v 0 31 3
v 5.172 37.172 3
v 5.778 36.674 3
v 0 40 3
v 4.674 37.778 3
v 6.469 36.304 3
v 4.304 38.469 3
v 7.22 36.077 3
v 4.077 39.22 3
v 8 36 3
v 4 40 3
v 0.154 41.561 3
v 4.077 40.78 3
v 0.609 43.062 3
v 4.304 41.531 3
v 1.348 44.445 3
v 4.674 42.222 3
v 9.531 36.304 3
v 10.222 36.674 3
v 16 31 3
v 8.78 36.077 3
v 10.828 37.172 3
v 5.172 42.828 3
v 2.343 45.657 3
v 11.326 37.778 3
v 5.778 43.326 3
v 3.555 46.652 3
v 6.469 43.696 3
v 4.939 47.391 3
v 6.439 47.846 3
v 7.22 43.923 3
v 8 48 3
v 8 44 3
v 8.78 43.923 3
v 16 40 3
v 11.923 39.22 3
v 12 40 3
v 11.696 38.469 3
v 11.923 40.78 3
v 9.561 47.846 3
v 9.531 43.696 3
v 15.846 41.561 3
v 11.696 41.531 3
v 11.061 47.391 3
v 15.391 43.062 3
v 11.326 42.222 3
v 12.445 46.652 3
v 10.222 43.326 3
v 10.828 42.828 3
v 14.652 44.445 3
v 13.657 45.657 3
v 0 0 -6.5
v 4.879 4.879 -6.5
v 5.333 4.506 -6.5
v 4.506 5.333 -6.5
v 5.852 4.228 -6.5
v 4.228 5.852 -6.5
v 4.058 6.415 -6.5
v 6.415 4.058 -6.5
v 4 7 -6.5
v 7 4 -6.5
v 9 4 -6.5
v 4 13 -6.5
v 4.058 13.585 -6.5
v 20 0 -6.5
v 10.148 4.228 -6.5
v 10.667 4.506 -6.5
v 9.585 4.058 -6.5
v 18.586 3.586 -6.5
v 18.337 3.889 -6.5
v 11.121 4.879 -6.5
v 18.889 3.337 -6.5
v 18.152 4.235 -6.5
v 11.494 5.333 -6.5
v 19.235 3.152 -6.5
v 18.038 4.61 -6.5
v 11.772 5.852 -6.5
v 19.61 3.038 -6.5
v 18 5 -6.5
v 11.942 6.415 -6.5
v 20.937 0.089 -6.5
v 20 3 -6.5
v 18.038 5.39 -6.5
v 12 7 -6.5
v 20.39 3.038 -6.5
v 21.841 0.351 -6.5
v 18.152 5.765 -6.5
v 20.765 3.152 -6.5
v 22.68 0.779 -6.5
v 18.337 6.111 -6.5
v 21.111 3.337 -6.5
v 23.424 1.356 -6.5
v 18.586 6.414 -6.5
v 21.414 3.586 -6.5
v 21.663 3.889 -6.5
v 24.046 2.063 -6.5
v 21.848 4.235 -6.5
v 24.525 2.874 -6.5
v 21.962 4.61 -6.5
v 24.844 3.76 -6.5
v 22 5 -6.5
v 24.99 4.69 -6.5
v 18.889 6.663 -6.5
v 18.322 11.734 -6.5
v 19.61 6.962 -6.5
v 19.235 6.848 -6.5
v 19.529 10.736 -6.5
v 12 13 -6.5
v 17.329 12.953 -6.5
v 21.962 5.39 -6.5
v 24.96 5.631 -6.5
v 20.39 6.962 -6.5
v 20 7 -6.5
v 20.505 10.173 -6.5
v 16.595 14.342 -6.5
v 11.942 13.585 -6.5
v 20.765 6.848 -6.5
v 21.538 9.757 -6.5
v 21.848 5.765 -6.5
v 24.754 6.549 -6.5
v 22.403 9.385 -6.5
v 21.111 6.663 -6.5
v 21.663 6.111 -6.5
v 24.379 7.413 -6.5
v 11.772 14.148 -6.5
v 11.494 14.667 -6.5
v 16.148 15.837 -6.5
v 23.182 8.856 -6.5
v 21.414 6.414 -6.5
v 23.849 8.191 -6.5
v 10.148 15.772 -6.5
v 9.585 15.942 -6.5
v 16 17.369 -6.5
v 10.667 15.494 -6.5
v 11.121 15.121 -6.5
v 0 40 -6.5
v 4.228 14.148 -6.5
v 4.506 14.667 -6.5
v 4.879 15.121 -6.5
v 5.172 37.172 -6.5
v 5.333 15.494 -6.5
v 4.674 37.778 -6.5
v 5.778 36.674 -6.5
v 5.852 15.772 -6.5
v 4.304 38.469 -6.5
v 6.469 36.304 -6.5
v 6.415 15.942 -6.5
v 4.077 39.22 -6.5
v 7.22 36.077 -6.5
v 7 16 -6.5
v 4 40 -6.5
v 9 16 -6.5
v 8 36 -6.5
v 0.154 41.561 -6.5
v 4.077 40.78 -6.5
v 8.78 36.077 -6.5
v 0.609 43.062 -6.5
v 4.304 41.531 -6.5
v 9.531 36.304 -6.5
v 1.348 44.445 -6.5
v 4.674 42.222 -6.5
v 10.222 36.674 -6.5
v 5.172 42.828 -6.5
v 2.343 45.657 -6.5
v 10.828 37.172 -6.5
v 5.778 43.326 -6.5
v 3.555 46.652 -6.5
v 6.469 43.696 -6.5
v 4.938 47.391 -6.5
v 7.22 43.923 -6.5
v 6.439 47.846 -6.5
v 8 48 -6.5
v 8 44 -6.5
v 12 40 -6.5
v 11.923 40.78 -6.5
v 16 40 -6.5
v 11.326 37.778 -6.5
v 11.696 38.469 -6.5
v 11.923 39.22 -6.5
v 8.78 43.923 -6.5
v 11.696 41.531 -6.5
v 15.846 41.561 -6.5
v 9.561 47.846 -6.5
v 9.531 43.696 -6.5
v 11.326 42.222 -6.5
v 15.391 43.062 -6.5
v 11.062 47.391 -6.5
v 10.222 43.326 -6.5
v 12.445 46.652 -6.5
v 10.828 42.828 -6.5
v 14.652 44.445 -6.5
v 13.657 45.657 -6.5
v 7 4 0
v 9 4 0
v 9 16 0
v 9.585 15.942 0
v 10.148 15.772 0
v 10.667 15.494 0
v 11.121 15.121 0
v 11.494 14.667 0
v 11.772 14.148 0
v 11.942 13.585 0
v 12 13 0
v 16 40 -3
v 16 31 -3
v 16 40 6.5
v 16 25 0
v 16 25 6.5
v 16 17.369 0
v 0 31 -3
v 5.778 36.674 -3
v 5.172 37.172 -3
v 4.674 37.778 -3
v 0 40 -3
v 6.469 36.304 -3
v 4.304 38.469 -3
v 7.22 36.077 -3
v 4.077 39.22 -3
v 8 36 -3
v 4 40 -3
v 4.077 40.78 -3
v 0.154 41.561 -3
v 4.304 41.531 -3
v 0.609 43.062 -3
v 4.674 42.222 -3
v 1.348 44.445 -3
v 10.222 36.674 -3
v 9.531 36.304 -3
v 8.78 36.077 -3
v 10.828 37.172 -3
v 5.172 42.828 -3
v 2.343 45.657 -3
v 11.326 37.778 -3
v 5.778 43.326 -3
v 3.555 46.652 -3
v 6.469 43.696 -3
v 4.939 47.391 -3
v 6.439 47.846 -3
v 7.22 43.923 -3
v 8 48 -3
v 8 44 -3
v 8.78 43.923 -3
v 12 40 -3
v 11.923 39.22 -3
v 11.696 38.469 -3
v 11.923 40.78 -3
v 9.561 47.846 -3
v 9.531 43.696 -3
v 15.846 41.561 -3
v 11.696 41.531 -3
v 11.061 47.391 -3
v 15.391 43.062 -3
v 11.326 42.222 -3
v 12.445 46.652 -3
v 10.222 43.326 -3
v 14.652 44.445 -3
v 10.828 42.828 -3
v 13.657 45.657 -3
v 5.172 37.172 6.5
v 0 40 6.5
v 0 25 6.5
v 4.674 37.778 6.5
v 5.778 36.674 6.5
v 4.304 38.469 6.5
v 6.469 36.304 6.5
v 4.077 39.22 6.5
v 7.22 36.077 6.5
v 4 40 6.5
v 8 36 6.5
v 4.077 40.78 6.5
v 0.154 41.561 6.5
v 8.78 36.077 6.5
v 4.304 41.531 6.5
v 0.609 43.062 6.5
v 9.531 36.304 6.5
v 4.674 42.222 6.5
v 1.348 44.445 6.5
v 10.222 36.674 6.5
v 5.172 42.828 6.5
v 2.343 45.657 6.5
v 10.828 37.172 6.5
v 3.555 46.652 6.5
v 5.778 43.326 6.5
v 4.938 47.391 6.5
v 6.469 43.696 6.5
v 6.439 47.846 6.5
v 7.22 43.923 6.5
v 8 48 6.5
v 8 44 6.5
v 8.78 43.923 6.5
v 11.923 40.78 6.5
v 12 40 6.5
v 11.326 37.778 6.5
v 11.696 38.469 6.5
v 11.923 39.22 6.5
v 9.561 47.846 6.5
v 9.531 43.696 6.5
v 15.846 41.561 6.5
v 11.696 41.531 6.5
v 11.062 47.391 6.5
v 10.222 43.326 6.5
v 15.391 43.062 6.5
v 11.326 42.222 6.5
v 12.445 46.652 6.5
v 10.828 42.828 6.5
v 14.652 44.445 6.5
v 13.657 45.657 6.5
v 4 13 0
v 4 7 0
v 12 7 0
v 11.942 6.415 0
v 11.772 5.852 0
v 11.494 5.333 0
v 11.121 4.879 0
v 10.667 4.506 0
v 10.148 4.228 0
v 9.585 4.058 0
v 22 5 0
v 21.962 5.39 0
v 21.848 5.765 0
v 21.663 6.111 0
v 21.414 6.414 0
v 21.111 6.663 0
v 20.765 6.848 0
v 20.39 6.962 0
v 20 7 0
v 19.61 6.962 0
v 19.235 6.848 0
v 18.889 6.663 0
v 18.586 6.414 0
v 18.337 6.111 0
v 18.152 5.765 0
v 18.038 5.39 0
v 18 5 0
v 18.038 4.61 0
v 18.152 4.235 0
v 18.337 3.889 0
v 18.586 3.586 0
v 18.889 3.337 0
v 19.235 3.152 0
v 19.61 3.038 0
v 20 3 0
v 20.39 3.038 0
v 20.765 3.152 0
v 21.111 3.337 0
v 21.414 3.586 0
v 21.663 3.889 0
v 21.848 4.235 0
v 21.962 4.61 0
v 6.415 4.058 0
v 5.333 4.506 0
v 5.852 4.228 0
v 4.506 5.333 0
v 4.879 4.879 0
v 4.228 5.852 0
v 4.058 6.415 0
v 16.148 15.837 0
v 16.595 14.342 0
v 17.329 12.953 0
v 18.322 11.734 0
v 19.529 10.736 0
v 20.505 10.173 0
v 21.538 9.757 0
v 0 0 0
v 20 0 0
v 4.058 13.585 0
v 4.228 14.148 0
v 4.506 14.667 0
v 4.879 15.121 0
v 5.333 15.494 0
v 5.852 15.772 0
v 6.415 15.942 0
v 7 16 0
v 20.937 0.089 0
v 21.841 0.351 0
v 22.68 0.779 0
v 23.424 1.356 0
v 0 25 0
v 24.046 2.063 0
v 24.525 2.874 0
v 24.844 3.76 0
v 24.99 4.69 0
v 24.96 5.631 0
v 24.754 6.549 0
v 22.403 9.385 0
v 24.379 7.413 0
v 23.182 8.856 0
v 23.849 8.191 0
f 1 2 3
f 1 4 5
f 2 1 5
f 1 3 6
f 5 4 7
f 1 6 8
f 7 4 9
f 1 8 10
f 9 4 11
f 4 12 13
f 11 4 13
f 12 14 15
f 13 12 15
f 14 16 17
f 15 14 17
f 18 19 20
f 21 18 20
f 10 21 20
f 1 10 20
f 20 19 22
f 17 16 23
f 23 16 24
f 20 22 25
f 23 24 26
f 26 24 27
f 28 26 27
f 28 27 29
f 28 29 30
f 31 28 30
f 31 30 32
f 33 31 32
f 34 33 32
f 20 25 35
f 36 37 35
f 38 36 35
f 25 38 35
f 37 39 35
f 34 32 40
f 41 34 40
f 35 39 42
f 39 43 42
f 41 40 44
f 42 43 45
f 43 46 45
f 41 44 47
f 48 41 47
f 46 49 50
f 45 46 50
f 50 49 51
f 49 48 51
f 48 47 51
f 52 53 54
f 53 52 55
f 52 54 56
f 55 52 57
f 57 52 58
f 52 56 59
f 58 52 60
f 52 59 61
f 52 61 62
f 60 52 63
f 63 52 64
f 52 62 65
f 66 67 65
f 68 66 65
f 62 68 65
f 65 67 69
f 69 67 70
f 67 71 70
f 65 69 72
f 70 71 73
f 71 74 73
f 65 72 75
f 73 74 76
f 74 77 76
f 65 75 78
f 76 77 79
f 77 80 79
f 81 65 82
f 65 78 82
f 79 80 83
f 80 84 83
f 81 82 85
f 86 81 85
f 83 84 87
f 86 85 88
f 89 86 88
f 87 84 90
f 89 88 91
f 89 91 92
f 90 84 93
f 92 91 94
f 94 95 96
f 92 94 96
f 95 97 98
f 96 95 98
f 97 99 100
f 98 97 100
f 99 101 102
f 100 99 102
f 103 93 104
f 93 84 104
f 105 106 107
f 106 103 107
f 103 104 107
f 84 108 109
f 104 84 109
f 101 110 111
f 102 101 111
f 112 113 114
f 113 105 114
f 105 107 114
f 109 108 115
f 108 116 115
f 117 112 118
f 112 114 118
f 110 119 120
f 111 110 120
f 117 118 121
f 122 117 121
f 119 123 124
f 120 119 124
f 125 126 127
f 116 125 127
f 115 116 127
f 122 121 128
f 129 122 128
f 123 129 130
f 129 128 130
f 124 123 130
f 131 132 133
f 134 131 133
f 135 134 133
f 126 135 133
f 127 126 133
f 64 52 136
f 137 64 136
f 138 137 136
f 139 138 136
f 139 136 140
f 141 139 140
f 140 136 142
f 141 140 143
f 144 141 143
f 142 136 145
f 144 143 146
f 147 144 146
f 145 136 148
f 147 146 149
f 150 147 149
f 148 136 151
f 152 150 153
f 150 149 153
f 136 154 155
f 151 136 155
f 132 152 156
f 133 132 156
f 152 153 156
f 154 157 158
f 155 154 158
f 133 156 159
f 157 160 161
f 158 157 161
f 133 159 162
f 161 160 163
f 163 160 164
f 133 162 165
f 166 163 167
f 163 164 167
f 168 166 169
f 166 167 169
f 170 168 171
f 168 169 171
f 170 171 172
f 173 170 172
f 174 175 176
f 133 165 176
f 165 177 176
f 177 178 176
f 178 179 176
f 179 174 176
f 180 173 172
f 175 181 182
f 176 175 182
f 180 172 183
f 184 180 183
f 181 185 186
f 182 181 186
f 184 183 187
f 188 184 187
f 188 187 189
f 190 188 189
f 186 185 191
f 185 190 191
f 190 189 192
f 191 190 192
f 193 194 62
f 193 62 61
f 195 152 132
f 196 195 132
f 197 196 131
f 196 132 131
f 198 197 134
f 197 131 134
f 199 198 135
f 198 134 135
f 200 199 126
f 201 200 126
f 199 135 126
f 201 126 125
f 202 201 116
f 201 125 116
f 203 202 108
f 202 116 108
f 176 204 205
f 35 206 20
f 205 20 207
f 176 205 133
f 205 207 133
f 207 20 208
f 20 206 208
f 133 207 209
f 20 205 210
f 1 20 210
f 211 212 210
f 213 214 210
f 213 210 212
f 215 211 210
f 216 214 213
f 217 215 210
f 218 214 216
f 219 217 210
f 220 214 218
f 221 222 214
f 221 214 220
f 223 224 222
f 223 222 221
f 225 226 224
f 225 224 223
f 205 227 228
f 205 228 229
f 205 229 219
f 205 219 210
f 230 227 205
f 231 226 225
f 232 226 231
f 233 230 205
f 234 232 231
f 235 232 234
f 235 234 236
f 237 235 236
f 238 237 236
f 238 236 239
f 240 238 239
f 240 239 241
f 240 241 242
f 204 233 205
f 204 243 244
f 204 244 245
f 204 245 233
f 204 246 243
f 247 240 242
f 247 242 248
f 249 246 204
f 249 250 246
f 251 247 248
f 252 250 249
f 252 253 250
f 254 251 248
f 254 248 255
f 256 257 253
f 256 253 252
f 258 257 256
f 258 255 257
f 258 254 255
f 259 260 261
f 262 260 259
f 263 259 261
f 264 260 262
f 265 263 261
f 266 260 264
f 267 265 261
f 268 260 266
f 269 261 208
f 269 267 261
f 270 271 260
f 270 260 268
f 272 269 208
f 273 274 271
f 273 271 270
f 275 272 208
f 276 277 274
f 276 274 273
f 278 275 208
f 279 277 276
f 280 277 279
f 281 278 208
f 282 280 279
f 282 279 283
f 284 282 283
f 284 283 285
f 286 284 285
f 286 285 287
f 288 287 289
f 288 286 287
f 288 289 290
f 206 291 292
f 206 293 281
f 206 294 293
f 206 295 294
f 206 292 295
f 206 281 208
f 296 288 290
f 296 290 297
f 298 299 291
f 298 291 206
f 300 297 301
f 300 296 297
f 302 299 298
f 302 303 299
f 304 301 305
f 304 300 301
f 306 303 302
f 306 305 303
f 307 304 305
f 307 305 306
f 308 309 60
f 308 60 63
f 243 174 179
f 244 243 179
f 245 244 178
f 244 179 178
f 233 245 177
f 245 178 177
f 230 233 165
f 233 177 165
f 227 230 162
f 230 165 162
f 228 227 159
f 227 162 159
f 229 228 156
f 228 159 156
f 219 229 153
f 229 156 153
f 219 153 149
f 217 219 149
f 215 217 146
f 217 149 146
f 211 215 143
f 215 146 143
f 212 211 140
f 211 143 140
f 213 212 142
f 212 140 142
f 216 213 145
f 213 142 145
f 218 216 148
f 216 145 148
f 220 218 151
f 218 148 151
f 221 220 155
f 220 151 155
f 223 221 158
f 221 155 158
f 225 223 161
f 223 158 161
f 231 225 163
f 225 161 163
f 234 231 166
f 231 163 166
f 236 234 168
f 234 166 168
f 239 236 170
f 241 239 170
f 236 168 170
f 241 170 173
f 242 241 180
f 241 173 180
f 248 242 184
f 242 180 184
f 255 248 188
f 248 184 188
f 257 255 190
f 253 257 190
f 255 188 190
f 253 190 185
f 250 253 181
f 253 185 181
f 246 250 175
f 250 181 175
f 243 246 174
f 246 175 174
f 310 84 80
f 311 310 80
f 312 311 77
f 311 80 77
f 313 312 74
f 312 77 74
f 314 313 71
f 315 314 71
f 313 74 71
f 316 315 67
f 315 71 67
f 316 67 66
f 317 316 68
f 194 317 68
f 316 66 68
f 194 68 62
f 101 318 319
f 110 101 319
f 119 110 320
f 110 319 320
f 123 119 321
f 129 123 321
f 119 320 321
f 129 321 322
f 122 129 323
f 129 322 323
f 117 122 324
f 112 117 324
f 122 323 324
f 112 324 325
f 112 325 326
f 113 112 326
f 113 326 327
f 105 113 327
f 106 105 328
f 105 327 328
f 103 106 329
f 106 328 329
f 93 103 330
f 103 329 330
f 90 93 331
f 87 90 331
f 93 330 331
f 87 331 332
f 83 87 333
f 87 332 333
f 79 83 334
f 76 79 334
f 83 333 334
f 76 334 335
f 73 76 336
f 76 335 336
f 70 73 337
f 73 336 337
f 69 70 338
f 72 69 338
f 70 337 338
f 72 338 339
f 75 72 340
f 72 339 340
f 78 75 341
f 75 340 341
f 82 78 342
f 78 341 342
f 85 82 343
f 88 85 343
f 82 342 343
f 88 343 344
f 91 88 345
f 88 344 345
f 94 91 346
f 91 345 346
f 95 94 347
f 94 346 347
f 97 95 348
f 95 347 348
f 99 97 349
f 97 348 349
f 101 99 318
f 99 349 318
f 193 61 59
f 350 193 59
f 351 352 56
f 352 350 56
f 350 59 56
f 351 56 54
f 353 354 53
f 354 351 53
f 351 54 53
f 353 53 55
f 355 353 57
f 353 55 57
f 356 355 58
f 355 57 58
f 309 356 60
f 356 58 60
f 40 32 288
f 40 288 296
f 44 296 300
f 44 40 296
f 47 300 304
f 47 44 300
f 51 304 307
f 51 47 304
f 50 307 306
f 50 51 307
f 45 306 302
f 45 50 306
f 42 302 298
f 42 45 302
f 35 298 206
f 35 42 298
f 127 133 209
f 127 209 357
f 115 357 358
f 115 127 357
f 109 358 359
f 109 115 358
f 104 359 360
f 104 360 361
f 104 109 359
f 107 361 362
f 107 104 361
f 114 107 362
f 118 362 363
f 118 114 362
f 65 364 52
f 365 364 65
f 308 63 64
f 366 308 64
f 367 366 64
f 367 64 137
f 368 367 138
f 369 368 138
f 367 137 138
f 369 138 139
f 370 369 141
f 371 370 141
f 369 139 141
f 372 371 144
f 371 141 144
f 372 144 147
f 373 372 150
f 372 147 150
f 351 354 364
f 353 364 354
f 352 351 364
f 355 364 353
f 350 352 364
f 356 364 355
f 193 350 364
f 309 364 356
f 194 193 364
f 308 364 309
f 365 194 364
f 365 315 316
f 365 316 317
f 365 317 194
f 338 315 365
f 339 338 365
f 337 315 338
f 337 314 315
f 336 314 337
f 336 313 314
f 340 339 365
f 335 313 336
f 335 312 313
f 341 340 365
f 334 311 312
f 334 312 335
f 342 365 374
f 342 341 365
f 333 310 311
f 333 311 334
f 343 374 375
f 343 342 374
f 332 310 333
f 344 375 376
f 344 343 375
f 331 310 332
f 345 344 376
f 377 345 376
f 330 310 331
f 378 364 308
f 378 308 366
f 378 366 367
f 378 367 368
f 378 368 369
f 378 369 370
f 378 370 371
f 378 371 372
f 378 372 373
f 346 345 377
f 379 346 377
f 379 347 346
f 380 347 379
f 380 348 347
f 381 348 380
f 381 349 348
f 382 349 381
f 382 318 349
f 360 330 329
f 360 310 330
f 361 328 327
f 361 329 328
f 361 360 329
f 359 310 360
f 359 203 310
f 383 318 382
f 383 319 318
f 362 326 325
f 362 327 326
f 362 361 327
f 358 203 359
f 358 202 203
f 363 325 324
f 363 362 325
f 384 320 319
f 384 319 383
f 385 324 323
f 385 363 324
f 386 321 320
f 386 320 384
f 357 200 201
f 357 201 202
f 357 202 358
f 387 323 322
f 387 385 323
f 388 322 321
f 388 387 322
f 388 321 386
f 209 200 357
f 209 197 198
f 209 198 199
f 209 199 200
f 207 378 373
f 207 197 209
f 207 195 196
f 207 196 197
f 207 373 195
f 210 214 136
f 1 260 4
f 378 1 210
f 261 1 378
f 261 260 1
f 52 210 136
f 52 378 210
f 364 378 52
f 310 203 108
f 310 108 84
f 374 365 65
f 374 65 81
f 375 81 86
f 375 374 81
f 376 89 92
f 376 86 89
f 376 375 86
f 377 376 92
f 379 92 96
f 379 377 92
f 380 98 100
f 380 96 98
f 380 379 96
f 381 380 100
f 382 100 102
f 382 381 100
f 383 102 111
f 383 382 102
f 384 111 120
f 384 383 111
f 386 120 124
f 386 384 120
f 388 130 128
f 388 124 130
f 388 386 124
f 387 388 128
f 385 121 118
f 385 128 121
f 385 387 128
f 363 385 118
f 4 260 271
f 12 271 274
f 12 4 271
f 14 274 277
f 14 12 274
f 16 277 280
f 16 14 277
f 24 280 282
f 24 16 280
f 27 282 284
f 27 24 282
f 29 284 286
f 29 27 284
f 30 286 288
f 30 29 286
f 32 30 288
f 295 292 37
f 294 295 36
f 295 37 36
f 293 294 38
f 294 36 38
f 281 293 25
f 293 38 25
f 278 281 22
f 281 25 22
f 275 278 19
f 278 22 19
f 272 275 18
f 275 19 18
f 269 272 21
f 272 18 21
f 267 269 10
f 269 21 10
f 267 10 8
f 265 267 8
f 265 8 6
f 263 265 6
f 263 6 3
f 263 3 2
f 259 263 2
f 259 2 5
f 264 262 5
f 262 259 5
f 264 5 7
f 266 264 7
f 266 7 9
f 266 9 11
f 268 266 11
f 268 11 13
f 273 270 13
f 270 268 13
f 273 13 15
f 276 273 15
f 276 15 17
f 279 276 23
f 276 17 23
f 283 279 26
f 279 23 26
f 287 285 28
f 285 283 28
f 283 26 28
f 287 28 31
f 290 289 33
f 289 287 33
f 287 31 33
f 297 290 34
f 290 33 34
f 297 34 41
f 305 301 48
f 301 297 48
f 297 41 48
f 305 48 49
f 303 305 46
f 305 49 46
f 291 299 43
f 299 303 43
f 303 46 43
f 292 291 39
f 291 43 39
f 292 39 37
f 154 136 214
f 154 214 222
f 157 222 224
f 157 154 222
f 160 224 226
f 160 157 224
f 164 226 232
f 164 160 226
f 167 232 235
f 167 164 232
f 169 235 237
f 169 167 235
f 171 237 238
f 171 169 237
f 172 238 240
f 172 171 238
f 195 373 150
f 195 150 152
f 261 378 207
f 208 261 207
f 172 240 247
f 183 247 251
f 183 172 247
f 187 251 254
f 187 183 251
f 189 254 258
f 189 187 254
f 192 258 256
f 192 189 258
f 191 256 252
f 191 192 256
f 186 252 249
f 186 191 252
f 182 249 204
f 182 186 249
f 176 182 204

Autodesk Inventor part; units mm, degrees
ref_plane "YZ Plane" through (0, 0, 0) normal (1, 0, 0) x (0, 1, 0)
ref_plane "XZ Plane" through (0, 0, 0) normal (0, 1, 0) x (-1, 0, 0)
ref_plane "XY Plane" through (0, 0, 0) normal (0, 0, 1) x (1, 0, 0)
sketch "스케치1" plane through (0, 0, 0) normal (0, 0, 1) x (1, 0, 0)
  line L0 (0, 0) -> (16, 0)
  line L1 (16, 48) -> (0, 48)
  line L2 (0, 48) -> (0, 0)
  line L3 (0, 0) -> (20, 0)
  line L4 (0, 0) -> (20, 0) construction
  circle A0 centre (20, 5) radius 2
  line L5 (20, 10) -> (16, 10)
  circle A1 centre (20, 5) radius 5
  line L6 (16, 48) -> (16, 10)
  circle A2 centre (8, 40) radius 4
  line L7 (4, 16) -> (12, 16)
  line L8 (12, 16) -> (12, 4)
  line L9 (12, 4) -> (4, 4)
  line L10 (4, 4) -> (4, 16)
  line L11 (0, 25) -> (16, 25)
  dimension "d0" = 16
  dimension "d4" = 48
  dimension "d5" = 20
  dimension "d8" = 4
  dimension "d9" = 10
  dimension "d10" = 8
  dimension "d11" = 40
  dimension "d12" = 8
  dimension "d13" = 12
  dimension "d14" = 4
  dimension "d15" = 4
  dimension "d16" = 8
  dimension "d17" = 25
extrude "돌출1" add sketch "스케치1" against normal blind 6.5 contours L2 L11 L6 L5 A1 L3 L0 | A1
extrude "돌출2" add sketch "스케치1" along normal mid plane 13 contours L2 L1 L6 L11
fillet "모깎기1" radius 8 2 edges at (16, 48, 0) (0, 48, 0)
fillet "모깎기2" radius 3 4 edges at (4, 16, -3.25) (12, 16, -3.25) (12, 4, -3.25) (4, 4, -3.25)
fillet "모깎기3" radius 8 1 edges at (16, 10, -3.25)
sketch "스케치2" plane through (0, 0, 0) normal (0, 0, 1) x (1, 0, 0)
  line L0 (-9.7469, 60.6249) -> (29.3105, 60.6249)
  line L1 (29.3105, 60.6249) -> (29.3105, 31)
  line L2 (29.3105, 31) -> (-9.7469, 31)
  line L3 (-9.7469, 31) -> (-9.7469, 60.6249)
  point P0 (0, 0)
  dimension "d25" = 31
extrude "돌출3" cut sketch "스케치2" along normal mid plane 6
properties part number "2번부품"
